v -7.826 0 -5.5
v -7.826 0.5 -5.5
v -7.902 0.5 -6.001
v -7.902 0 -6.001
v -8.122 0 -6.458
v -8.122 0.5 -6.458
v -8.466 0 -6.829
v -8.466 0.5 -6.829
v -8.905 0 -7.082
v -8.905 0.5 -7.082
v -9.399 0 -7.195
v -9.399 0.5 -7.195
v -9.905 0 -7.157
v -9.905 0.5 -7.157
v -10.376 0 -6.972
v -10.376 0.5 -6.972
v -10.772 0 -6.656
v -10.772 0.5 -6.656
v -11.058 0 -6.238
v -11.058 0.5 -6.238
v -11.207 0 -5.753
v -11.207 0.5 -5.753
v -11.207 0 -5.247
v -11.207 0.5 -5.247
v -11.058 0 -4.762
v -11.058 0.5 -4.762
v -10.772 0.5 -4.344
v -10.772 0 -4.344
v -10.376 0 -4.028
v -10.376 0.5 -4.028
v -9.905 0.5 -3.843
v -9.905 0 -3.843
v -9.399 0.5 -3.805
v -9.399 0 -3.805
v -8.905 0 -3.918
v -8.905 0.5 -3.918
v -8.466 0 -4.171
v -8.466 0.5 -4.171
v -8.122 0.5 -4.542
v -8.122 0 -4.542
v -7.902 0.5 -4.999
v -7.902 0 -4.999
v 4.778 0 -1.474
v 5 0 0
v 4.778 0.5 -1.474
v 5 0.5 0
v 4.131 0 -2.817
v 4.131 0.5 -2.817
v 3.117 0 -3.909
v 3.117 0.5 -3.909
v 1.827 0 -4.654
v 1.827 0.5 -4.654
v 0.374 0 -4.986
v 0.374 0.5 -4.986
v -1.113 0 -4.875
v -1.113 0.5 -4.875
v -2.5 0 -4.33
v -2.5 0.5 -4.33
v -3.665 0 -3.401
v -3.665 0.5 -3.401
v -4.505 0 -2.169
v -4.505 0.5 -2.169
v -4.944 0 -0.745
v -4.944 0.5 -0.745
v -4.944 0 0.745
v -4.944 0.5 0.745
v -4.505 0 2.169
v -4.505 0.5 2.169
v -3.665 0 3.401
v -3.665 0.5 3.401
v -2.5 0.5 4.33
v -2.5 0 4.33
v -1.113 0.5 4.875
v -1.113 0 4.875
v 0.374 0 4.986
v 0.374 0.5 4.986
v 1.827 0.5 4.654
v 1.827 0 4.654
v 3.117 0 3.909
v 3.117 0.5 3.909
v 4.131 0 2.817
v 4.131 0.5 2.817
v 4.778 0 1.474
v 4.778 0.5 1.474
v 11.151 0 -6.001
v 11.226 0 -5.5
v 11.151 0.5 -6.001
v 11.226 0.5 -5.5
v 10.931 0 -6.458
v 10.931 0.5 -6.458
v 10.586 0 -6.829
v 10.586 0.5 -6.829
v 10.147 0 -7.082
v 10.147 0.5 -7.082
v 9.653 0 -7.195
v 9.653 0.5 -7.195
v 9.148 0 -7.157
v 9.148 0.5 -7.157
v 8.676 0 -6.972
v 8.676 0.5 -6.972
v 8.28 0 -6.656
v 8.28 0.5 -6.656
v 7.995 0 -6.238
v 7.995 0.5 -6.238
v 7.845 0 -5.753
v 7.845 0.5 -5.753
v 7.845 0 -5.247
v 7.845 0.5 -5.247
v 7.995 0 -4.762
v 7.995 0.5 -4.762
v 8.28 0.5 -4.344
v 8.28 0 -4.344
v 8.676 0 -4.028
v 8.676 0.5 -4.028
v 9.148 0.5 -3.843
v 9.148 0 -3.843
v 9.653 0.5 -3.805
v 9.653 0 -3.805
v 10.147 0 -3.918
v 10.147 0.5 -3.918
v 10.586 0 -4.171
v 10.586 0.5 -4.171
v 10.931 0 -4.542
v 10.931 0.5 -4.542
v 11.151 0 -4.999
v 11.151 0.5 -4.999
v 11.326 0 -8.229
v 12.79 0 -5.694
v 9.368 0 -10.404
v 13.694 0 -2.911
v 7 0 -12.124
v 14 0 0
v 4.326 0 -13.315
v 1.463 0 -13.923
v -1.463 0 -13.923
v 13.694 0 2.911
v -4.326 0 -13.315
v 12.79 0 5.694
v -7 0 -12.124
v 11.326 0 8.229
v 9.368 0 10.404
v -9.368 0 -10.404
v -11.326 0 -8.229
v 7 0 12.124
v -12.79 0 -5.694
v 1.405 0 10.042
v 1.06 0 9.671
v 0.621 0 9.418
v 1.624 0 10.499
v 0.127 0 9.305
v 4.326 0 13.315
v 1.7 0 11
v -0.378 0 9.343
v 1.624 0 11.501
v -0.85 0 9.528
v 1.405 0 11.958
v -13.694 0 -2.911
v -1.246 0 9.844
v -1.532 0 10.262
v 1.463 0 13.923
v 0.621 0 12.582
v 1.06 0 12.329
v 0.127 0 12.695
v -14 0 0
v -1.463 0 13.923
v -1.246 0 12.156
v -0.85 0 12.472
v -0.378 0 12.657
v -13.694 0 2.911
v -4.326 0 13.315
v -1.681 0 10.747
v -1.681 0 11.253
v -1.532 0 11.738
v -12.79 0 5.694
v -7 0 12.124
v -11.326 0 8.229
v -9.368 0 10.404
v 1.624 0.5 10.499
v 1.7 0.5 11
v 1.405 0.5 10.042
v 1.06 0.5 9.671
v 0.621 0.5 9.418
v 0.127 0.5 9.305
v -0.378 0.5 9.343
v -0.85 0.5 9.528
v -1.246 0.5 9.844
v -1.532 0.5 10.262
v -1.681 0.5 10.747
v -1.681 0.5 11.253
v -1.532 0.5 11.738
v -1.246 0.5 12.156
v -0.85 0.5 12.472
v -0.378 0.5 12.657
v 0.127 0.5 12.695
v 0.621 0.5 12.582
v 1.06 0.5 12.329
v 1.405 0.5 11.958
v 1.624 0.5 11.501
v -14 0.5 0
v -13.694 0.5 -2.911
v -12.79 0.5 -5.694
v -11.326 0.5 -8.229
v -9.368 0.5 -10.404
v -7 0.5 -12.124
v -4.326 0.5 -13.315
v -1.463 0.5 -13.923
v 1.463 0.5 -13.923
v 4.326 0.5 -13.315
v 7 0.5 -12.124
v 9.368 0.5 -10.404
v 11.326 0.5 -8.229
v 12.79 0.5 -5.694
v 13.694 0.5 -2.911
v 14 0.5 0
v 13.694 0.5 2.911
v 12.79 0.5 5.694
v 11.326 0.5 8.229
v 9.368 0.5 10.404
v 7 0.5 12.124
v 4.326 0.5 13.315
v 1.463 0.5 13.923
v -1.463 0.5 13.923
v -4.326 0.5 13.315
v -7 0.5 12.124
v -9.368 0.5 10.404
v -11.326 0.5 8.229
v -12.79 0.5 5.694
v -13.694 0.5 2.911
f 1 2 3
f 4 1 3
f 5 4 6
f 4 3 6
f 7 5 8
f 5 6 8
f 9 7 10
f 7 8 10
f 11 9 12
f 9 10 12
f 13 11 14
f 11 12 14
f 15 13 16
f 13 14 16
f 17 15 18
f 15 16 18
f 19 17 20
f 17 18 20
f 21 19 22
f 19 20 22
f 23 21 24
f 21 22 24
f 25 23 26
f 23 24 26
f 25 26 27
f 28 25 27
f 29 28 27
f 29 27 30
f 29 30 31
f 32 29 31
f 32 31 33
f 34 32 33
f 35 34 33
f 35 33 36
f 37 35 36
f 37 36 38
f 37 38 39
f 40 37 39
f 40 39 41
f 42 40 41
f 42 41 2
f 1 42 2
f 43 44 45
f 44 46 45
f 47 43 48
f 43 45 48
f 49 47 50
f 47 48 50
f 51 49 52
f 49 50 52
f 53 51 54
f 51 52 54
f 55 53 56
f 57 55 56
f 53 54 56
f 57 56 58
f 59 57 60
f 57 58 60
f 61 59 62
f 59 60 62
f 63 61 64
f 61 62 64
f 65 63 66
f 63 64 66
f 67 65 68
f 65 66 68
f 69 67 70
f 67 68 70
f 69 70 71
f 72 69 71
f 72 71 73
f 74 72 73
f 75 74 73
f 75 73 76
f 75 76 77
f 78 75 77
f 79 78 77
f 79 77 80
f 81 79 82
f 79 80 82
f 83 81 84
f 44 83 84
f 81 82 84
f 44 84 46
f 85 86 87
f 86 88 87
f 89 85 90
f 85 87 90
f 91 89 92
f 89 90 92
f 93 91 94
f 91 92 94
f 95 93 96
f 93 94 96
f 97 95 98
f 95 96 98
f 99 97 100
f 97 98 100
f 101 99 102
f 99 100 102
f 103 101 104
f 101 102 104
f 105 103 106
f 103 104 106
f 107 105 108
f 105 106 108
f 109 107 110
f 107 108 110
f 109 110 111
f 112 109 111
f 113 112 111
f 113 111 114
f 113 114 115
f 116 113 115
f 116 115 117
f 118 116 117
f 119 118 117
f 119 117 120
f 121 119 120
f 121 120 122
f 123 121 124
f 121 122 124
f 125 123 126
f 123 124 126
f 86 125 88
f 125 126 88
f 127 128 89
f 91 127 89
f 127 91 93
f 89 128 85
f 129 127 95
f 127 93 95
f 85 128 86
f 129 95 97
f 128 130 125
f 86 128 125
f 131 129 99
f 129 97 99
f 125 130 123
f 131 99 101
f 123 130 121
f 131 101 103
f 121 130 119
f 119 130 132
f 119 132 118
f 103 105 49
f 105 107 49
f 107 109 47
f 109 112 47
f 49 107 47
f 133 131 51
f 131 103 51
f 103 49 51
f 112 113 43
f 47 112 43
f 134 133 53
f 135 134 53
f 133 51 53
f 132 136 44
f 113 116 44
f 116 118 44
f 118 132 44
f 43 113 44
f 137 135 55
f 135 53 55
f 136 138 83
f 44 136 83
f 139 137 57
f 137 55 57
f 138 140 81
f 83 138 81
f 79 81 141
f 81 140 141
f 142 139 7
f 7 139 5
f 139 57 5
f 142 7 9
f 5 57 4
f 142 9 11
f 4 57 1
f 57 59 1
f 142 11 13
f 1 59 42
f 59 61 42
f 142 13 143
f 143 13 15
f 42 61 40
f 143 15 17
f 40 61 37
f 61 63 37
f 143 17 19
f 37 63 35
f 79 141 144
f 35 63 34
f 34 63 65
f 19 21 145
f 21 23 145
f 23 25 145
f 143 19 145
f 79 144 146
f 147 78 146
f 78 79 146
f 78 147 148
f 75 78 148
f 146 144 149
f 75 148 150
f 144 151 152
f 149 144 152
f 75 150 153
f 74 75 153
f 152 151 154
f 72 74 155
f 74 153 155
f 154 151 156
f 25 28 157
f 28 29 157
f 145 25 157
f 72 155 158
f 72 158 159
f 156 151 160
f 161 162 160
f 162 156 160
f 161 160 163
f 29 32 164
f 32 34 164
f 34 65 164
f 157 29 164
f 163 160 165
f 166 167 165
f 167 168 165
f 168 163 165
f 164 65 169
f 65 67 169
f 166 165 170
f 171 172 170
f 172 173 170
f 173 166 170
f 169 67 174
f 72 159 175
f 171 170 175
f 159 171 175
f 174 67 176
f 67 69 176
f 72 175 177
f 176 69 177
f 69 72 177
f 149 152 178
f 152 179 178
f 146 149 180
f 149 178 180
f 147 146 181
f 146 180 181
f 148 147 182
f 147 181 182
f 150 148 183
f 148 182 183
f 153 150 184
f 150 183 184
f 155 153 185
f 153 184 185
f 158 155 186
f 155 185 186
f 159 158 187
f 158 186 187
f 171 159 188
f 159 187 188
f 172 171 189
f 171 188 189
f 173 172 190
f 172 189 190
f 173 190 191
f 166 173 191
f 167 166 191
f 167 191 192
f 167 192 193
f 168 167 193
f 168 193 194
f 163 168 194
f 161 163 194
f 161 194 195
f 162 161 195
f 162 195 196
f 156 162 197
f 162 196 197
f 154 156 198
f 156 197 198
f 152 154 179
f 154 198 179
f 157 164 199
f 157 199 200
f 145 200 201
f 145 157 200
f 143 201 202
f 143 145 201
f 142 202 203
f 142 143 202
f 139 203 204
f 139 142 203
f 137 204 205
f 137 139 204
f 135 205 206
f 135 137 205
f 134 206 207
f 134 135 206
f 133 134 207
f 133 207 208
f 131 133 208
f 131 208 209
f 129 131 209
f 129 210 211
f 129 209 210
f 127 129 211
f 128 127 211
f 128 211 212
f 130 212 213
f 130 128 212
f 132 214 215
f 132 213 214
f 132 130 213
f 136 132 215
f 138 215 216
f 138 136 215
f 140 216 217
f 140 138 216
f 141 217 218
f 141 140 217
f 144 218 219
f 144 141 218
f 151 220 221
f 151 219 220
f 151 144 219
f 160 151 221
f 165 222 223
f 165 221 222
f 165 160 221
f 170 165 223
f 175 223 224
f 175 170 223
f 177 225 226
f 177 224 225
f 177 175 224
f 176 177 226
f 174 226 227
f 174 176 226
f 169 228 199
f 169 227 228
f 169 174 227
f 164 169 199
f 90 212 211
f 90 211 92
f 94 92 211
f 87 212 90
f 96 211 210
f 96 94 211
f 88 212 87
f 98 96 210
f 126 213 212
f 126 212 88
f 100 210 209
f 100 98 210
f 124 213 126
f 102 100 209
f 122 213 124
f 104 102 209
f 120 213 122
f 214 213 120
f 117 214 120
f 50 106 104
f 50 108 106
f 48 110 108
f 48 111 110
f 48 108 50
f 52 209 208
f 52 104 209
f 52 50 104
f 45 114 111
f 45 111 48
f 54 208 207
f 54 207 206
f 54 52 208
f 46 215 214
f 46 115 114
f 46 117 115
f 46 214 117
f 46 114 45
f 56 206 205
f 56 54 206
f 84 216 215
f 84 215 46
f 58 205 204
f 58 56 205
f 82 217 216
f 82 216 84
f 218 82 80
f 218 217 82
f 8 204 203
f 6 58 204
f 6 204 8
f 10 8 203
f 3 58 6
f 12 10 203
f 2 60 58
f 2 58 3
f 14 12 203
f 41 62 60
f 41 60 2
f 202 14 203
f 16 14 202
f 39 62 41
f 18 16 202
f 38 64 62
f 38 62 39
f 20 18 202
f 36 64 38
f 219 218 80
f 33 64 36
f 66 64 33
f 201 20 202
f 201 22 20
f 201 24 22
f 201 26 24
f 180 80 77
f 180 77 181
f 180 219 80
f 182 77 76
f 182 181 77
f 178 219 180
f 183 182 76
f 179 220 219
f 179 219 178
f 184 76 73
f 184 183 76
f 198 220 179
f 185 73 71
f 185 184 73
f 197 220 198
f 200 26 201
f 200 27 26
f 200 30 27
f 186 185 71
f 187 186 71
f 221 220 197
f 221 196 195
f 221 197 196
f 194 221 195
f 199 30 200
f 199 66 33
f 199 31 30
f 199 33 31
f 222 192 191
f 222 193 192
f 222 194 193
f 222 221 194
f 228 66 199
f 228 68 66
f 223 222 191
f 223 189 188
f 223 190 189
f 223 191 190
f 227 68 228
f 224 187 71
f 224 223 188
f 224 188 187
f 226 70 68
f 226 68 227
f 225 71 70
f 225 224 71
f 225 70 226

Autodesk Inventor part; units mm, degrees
ref_plane "YZ Plane" through (0, 0, 0) normal (1, 0, 0) x (0, 1, 0)
ref_plane "XZ Plane" through (0, 0, 0) normal (0, 1, 0) x (-1, 0, 0)
ref_plane "XY Plane" through (0, 0, 0) normal (0, 0, 1) x (1, 0, 0)
sketch "スケッチ1" plane through (0, 0, 0) normal (0, 1, 0) x (-1, 0, 0)
  circle A0 centre (0, 0) radius 14
  dimension "d0" = 28
extrude "押し出し1" add sketch "スケッチ1" along normal blind 0.5
sketch "スケッチ2" plane through (0, 0.5, 0) normal (0, 1, 0) x (1, 0, 0)
  circle A0 centre (0, -11) radius 1.7
  circle A1 centre (9.5263, 5.5) radius 1.7
  circle A2 centre (-9.5263, 5.5) radius 1.7
  point P0 (0, 0)
  dimension "d4" = 3.4
  dimension "d12" = 11
  dimension "d15" = 360
extrude "押し出し2" cut sketch "スケッチ2" against normal through all
sketch "スケッチ3" plane through (0, 0.5, 0) normal (0, 1, 0) x (1, 0, 0)
  circle A0 centre (0, 0) radius 5
  dimension "d9" = 10
extrude "押し出し3" cut sketch "スケッチ3" against normal through all
properties part number "B_holder_up_5" material "ステンレス鋼 440C"
